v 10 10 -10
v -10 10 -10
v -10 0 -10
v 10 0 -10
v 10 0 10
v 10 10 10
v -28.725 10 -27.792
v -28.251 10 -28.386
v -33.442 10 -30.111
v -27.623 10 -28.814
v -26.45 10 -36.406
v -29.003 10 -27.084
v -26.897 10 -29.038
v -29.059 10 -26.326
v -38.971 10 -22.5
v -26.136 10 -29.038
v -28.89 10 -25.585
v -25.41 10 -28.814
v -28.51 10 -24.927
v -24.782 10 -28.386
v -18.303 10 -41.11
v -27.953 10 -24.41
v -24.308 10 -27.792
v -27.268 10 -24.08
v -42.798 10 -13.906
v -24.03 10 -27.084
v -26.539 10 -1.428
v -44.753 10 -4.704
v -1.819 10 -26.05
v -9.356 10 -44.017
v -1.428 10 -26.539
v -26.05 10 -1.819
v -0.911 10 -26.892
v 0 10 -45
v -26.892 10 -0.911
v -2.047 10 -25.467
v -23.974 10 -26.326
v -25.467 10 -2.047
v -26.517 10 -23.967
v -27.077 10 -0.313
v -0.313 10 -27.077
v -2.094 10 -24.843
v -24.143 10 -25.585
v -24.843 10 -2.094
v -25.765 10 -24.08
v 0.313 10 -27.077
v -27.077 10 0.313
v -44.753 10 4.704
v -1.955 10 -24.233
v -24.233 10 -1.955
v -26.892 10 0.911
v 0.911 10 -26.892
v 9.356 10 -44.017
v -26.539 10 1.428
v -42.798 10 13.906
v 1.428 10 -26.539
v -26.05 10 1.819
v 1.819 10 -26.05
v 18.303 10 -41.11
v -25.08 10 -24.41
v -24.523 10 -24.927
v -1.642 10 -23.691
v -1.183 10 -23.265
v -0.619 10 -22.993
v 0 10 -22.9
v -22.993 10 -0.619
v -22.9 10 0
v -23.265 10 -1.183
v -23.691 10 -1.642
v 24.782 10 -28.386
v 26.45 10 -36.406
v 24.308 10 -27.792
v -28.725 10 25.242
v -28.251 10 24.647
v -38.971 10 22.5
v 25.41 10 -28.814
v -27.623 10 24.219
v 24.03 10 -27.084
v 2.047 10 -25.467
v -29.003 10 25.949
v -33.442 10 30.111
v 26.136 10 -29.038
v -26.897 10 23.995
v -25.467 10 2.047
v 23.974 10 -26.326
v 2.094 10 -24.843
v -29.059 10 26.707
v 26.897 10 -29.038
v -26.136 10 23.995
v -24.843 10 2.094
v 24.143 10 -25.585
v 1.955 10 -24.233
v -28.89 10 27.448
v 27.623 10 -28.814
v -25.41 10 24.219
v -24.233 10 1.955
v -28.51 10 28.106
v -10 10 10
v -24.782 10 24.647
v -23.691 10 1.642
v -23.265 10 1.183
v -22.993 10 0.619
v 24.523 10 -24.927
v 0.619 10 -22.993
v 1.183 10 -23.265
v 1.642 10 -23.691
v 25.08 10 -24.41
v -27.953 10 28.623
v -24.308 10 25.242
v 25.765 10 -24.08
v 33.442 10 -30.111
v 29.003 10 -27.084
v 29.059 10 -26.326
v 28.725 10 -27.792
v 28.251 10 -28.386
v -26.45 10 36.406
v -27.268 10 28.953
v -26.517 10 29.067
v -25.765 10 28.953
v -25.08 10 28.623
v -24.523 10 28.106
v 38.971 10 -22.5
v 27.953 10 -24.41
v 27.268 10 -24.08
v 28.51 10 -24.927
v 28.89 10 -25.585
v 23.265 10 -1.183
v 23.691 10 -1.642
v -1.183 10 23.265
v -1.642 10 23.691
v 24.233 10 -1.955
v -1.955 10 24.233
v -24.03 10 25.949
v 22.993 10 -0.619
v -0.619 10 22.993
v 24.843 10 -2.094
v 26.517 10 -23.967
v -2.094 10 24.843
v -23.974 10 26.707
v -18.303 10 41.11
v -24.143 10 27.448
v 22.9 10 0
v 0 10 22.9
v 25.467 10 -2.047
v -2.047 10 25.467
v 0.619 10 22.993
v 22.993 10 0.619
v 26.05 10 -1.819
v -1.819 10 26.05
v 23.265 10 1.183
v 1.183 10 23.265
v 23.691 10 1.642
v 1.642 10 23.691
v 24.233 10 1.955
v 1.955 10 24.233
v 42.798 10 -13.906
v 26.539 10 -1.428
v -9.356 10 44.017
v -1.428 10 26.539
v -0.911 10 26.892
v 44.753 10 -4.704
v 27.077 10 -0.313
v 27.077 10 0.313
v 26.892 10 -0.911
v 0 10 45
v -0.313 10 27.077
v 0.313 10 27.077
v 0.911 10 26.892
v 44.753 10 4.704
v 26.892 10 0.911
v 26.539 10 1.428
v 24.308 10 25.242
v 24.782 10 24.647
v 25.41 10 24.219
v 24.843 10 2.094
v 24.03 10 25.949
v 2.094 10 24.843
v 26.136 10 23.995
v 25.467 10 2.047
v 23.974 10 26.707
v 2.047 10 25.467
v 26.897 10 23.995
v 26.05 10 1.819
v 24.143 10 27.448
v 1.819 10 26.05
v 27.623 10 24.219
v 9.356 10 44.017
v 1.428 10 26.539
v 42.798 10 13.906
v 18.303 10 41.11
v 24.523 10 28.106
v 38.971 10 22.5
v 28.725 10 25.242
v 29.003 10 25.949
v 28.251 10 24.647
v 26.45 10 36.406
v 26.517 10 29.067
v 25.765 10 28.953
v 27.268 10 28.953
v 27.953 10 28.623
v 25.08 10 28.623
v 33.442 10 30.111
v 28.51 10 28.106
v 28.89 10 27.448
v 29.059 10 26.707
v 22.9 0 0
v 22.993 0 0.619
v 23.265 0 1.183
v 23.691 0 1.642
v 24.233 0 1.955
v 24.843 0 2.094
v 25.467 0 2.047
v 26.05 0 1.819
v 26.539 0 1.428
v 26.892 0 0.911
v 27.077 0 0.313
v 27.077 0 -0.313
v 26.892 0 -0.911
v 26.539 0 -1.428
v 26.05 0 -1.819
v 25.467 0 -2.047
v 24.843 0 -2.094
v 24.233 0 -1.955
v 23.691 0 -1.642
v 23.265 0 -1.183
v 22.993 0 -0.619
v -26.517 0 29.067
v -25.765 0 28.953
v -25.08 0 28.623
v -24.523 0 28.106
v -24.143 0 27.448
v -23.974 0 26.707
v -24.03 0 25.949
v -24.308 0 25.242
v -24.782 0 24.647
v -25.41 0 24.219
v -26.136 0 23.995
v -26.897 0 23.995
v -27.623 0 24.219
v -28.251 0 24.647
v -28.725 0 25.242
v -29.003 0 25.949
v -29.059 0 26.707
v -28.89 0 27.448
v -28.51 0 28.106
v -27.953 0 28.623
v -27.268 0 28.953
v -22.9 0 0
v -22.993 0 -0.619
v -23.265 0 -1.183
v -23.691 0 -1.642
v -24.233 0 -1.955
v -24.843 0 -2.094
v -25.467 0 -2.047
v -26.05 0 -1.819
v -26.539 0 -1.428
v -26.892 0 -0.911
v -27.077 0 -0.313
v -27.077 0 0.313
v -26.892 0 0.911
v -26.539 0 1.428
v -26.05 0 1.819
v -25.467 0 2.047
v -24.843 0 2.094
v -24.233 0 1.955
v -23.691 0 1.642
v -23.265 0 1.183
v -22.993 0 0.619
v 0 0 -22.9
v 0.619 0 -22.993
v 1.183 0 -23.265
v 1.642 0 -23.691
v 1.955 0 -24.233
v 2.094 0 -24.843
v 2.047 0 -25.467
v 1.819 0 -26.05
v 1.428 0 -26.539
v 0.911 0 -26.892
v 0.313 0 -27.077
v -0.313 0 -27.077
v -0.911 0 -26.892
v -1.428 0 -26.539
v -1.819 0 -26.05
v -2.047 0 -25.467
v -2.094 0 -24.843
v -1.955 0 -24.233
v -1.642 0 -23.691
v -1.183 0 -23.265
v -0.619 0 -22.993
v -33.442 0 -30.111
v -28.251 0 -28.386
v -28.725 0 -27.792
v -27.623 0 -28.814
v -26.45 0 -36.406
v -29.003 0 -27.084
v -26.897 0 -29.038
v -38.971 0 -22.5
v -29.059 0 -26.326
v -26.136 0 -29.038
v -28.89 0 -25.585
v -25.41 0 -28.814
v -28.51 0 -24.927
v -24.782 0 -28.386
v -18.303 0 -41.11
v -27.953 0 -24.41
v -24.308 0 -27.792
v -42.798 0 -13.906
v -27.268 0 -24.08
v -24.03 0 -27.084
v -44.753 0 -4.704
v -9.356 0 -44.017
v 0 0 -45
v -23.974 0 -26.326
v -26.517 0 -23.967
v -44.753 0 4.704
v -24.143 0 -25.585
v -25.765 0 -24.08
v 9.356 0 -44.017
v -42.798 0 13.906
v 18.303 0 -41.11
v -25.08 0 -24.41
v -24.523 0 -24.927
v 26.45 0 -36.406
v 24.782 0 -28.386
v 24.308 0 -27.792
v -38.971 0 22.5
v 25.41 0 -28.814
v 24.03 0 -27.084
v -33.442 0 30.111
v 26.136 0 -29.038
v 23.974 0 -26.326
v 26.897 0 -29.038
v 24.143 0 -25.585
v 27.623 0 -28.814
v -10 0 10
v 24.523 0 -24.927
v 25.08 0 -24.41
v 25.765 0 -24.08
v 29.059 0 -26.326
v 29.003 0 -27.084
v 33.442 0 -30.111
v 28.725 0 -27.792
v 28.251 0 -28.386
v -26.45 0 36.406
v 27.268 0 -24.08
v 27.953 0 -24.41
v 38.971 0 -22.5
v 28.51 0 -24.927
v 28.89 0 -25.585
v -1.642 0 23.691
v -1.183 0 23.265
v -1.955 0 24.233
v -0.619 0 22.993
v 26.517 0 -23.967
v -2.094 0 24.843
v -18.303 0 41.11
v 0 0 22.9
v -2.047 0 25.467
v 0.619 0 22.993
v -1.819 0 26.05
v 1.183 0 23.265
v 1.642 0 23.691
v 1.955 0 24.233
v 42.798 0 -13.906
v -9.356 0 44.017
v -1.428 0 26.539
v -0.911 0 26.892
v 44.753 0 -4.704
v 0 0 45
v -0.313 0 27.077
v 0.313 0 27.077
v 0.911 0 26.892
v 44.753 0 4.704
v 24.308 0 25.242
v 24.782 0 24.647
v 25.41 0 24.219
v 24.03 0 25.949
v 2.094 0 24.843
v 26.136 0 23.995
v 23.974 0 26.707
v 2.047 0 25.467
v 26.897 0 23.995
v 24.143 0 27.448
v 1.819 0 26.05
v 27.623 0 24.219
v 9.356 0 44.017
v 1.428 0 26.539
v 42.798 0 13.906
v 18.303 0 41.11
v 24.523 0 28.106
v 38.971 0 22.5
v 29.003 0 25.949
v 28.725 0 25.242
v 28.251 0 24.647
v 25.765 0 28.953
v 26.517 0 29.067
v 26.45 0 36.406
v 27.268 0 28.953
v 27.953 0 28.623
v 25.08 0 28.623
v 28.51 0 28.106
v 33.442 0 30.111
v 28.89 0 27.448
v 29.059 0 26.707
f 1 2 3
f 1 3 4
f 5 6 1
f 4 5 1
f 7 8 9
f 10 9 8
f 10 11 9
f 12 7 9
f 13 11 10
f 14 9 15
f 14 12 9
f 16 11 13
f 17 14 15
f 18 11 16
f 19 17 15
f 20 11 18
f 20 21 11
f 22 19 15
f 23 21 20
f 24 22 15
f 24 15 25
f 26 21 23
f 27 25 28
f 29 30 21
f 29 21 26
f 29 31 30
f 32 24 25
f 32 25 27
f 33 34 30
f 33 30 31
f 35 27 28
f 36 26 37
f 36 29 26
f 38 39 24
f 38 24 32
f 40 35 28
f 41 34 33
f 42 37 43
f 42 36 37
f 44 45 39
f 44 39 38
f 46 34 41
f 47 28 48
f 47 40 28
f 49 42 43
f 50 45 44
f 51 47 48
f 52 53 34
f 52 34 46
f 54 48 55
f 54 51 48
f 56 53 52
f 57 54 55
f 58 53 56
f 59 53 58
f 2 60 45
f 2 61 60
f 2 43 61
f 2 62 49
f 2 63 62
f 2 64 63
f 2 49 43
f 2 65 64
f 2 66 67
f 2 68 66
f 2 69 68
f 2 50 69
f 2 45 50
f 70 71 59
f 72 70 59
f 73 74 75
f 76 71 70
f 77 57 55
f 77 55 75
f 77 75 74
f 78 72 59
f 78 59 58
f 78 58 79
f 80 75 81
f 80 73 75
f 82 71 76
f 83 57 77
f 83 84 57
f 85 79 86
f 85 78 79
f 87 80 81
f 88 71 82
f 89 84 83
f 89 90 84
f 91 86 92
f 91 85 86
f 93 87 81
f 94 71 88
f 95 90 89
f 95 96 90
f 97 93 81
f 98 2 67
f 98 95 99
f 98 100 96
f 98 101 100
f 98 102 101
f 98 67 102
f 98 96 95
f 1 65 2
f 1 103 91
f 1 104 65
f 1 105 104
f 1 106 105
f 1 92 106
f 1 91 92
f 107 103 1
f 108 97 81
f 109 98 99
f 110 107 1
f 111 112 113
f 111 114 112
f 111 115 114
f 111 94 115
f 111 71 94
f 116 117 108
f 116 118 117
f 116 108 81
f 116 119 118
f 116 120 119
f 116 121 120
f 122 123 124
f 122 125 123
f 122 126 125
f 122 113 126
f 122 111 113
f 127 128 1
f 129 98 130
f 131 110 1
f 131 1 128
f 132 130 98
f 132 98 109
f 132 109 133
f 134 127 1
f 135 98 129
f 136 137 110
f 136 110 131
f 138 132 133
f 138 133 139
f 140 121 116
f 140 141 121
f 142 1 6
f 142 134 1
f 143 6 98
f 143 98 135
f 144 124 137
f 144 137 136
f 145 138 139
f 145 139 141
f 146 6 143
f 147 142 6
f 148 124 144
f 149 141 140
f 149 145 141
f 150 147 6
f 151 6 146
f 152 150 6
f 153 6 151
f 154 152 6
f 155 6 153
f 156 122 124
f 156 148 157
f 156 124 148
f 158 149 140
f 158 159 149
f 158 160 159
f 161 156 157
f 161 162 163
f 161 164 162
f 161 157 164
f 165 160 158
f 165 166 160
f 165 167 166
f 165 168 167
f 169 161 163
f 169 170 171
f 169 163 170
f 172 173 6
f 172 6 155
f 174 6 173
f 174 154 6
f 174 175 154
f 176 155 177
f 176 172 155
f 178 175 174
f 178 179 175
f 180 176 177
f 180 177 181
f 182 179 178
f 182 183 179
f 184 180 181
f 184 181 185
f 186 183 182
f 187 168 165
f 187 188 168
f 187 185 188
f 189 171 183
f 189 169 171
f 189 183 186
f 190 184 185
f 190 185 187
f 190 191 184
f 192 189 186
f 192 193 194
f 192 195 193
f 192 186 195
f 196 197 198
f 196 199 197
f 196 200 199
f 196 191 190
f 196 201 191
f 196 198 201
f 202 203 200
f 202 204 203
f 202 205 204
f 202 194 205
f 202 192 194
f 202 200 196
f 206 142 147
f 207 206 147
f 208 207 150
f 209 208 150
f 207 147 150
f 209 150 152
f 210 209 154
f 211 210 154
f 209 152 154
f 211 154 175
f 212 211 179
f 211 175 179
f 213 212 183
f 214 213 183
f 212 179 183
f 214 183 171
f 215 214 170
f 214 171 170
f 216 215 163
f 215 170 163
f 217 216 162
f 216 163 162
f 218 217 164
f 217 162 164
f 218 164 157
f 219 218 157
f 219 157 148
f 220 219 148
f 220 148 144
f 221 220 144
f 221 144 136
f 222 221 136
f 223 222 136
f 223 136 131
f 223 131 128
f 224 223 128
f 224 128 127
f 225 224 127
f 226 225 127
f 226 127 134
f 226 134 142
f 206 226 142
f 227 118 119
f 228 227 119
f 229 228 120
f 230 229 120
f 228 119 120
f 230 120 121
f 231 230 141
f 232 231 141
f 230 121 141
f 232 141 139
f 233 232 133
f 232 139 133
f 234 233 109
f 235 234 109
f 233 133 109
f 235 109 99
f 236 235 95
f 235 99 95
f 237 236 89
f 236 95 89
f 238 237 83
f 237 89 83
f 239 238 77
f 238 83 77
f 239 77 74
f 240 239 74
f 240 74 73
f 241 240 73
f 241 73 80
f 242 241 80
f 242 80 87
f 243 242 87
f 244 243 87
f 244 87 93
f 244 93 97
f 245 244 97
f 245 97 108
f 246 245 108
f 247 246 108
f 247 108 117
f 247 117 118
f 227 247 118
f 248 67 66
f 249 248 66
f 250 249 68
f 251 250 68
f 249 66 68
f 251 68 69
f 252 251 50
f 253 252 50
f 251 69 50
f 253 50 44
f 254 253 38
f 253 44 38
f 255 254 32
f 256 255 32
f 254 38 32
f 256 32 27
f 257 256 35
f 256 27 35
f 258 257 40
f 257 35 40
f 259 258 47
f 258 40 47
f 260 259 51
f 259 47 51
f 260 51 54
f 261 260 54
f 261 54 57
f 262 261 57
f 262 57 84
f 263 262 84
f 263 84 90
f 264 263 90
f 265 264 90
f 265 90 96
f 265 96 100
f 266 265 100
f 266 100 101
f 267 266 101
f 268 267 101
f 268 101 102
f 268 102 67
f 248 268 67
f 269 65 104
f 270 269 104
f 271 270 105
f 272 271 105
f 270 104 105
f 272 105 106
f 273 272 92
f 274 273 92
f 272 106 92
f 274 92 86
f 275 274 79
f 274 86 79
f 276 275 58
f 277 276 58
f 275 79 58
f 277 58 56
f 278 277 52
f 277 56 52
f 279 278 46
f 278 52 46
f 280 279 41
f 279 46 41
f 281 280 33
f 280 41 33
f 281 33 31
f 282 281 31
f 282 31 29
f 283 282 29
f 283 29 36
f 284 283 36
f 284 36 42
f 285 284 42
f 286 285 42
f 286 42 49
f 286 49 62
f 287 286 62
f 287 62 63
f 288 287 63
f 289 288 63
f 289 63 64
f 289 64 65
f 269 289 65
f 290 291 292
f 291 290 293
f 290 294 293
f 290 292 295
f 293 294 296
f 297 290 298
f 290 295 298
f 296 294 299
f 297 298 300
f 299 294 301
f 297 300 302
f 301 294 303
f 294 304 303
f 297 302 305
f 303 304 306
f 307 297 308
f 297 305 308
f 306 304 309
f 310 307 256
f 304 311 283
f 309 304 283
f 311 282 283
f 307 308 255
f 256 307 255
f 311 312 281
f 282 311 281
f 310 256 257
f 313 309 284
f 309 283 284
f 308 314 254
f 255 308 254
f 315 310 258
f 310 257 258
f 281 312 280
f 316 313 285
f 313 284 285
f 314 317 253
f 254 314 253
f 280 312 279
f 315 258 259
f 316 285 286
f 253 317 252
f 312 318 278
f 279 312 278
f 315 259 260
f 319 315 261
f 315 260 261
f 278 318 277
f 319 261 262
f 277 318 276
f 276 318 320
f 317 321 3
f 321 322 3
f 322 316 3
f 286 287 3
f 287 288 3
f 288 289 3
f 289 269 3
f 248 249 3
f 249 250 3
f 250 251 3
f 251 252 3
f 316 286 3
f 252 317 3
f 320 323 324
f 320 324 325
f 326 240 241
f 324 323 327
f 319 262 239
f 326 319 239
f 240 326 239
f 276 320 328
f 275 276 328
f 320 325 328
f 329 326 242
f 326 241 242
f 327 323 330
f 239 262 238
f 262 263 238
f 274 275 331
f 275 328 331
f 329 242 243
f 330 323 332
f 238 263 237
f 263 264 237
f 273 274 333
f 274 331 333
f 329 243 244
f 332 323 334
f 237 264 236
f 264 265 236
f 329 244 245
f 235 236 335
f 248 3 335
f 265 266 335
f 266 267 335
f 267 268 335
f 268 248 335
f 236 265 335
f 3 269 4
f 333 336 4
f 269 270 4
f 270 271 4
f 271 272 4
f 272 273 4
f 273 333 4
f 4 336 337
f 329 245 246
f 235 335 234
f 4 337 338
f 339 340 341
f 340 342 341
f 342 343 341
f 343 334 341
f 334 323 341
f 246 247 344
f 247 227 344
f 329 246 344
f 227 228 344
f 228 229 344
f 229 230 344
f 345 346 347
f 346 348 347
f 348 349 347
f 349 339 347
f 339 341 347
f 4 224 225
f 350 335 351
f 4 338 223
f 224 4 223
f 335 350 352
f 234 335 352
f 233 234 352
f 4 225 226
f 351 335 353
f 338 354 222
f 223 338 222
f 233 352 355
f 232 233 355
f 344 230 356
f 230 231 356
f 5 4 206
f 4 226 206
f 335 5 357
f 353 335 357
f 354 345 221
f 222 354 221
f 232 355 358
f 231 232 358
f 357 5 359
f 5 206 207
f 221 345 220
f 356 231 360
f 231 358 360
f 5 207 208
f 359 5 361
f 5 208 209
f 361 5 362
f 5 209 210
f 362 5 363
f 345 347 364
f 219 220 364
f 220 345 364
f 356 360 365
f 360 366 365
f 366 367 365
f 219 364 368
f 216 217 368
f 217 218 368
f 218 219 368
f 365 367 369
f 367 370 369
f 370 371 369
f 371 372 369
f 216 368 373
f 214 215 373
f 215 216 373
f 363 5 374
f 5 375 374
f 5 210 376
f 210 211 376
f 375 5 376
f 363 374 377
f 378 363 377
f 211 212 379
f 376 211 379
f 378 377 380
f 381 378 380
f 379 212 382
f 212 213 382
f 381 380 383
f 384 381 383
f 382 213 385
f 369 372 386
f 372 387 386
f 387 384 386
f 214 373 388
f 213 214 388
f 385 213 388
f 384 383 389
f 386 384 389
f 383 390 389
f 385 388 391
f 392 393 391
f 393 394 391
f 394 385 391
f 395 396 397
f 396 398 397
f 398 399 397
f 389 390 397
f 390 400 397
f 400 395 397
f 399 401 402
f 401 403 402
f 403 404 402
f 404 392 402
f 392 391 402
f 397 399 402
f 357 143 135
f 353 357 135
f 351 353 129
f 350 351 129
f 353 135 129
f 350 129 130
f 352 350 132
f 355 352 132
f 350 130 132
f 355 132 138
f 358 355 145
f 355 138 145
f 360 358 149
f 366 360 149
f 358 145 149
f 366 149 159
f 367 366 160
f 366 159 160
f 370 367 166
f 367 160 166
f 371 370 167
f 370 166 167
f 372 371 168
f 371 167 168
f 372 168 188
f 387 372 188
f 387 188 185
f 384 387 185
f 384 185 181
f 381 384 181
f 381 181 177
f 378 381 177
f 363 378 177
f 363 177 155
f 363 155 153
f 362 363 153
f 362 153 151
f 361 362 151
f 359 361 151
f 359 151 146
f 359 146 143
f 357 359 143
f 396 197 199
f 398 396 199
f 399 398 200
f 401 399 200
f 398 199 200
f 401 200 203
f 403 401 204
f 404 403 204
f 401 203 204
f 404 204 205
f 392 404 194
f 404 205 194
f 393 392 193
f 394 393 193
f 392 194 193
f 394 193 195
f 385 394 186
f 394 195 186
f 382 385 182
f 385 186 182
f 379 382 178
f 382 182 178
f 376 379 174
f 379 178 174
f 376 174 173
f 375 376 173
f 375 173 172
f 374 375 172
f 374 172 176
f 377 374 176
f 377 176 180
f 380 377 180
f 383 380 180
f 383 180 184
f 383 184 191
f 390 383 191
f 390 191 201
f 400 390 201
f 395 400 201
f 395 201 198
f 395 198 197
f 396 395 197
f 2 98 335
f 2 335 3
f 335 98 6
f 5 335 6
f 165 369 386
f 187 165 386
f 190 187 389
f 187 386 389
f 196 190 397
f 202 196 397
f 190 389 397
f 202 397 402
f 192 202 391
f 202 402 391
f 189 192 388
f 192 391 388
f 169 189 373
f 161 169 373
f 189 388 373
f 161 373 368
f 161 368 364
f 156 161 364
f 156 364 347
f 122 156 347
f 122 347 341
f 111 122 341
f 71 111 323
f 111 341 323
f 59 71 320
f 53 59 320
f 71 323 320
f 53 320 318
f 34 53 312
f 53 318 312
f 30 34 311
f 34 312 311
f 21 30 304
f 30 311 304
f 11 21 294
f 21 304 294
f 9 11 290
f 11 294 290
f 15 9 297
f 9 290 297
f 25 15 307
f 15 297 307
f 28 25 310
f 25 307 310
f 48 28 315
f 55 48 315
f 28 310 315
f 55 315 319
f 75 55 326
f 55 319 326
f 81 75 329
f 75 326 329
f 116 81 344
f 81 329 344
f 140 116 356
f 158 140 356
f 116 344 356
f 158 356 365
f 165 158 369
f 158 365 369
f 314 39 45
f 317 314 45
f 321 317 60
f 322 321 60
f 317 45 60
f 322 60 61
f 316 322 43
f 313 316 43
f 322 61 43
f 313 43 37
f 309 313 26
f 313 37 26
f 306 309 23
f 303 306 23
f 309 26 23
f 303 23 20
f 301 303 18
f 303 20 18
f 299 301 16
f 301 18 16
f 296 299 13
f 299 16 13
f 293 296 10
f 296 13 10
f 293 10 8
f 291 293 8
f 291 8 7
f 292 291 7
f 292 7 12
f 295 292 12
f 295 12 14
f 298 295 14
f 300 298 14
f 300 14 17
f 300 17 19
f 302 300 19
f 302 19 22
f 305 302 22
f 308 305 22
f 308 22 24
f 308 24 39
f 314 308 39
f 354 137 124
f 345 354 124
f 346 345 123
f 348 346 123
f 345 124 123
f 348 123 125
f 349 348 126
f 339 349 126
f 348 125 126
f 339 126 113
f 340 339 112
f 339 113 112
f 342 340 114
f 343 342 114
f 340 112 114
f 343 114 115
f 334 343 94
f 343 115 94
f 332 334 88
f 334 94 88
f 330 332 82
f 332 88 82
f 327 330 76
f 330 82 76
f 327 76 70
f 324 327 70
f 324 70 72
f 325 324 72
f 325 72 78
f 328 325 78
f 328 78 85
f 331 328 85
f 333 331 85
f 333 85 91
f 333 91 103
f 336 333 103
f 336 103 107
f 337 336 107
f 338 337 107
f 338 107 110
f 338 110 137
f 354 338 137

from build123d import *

# Parameters (mm, degrees)
SKETCH1_R           = 45
BOSS_EXTRUDE1_DEPTH = 10
SKETCH3_R           = 2.1
CUT_EXTRUDE2_DEPTH  = 65.420493634
CIRPATTERN1_COUNT   = 4
SKETCH4_W           = 20
SKETCH4_H           = 20
CUT_EXTRUDE3_DEPTH  = 10
SKETCH6_R           = 2.55
CUT_EXTRUDE4_DEPTH  = 65.420493634


with BuildPart() as part:
    # Sketch1 → Boss-Extrude1 (new body)
    with BuildSketch(Plane(origin=(0, 0, 0), x_dir=(1, 0, 0), z_dir=(0, 1, 0))):
        with Locations(Location((0, 0, 0), (0, 0, 270))):
            Circle(SKETCH1_R)
    extrude(amount=BOSS_EXTRUDE1_DEPTH)

    # Sketch3 → Cut-Extrude2 (cut, through all)
    with BuildSketch(Plane(origin=(0, 10, 0), x_dir=(1, 0, 0), z_dir=(0, 1, 0))):
        with Locations(Location((0, 25, 0), (0, 0, 270))):
            Circle(SKETCH3_R)
    cut_extrude2 = extrude(amount=-CUT_EXTRUDE2_DEPTH, mode=Mode.SUBTRACT)

    # CirPattern1: Cut-Extrude2 ×4 about axis
    cirpattern1_axis = Axis((0, 0, 0), (0, 1, 0))
    for i in range(1, CIRPATTERN1_COUNT):
        add(cut_extrude2.rotate(cirpattern1_axis, i * 360 / CIRPATTERN1_COUNT), mode=Mode.SUBTRACT)

    # Sketch4 → Cut-Extrude3 (cut)
    with BuildSketch(Plane(origin=(0, 10, 0), x_dir=(1, 0, 0), z_dir=(0, 1, 0))):
        Rectangle(SKETCH4_W, SKETCH4_H)
    extrude(amount=-CUT_EXTRUDE3_DEPTH, mode=Mode.SUBTRACT)

    # Sketch6 → Cut-Extrude4 (cut, through all)
    with BuildSketch(Plane(origin=(0, 10, 0), x_dir=(1, 0, 0), z_dir=(0, 1, 0))):
        with Locations(Location((-26.516504294, 26.516504294, 0), (0, 0, 270))):
            Circle(SKETCH6_R)
        with Locations(Location((26.516504294, 26.516504294, 0), (0, 0, 270))):
            Circle(SKETCH6_R)
        with Locations(Location((26.516504294, -26.516504294, 0), (0, 0, 270))):
            Circle(SKETCH6_R)
        with Locations(Location((-26.516504294, -26.516504294, 0), (0, 0, 270))):
            Circle(SKETCH6_R)
    extrude(amount=-CUT_EXTRUDE4_DEPTH, mode=Mode.SUBTRACT)


solid = part.part
